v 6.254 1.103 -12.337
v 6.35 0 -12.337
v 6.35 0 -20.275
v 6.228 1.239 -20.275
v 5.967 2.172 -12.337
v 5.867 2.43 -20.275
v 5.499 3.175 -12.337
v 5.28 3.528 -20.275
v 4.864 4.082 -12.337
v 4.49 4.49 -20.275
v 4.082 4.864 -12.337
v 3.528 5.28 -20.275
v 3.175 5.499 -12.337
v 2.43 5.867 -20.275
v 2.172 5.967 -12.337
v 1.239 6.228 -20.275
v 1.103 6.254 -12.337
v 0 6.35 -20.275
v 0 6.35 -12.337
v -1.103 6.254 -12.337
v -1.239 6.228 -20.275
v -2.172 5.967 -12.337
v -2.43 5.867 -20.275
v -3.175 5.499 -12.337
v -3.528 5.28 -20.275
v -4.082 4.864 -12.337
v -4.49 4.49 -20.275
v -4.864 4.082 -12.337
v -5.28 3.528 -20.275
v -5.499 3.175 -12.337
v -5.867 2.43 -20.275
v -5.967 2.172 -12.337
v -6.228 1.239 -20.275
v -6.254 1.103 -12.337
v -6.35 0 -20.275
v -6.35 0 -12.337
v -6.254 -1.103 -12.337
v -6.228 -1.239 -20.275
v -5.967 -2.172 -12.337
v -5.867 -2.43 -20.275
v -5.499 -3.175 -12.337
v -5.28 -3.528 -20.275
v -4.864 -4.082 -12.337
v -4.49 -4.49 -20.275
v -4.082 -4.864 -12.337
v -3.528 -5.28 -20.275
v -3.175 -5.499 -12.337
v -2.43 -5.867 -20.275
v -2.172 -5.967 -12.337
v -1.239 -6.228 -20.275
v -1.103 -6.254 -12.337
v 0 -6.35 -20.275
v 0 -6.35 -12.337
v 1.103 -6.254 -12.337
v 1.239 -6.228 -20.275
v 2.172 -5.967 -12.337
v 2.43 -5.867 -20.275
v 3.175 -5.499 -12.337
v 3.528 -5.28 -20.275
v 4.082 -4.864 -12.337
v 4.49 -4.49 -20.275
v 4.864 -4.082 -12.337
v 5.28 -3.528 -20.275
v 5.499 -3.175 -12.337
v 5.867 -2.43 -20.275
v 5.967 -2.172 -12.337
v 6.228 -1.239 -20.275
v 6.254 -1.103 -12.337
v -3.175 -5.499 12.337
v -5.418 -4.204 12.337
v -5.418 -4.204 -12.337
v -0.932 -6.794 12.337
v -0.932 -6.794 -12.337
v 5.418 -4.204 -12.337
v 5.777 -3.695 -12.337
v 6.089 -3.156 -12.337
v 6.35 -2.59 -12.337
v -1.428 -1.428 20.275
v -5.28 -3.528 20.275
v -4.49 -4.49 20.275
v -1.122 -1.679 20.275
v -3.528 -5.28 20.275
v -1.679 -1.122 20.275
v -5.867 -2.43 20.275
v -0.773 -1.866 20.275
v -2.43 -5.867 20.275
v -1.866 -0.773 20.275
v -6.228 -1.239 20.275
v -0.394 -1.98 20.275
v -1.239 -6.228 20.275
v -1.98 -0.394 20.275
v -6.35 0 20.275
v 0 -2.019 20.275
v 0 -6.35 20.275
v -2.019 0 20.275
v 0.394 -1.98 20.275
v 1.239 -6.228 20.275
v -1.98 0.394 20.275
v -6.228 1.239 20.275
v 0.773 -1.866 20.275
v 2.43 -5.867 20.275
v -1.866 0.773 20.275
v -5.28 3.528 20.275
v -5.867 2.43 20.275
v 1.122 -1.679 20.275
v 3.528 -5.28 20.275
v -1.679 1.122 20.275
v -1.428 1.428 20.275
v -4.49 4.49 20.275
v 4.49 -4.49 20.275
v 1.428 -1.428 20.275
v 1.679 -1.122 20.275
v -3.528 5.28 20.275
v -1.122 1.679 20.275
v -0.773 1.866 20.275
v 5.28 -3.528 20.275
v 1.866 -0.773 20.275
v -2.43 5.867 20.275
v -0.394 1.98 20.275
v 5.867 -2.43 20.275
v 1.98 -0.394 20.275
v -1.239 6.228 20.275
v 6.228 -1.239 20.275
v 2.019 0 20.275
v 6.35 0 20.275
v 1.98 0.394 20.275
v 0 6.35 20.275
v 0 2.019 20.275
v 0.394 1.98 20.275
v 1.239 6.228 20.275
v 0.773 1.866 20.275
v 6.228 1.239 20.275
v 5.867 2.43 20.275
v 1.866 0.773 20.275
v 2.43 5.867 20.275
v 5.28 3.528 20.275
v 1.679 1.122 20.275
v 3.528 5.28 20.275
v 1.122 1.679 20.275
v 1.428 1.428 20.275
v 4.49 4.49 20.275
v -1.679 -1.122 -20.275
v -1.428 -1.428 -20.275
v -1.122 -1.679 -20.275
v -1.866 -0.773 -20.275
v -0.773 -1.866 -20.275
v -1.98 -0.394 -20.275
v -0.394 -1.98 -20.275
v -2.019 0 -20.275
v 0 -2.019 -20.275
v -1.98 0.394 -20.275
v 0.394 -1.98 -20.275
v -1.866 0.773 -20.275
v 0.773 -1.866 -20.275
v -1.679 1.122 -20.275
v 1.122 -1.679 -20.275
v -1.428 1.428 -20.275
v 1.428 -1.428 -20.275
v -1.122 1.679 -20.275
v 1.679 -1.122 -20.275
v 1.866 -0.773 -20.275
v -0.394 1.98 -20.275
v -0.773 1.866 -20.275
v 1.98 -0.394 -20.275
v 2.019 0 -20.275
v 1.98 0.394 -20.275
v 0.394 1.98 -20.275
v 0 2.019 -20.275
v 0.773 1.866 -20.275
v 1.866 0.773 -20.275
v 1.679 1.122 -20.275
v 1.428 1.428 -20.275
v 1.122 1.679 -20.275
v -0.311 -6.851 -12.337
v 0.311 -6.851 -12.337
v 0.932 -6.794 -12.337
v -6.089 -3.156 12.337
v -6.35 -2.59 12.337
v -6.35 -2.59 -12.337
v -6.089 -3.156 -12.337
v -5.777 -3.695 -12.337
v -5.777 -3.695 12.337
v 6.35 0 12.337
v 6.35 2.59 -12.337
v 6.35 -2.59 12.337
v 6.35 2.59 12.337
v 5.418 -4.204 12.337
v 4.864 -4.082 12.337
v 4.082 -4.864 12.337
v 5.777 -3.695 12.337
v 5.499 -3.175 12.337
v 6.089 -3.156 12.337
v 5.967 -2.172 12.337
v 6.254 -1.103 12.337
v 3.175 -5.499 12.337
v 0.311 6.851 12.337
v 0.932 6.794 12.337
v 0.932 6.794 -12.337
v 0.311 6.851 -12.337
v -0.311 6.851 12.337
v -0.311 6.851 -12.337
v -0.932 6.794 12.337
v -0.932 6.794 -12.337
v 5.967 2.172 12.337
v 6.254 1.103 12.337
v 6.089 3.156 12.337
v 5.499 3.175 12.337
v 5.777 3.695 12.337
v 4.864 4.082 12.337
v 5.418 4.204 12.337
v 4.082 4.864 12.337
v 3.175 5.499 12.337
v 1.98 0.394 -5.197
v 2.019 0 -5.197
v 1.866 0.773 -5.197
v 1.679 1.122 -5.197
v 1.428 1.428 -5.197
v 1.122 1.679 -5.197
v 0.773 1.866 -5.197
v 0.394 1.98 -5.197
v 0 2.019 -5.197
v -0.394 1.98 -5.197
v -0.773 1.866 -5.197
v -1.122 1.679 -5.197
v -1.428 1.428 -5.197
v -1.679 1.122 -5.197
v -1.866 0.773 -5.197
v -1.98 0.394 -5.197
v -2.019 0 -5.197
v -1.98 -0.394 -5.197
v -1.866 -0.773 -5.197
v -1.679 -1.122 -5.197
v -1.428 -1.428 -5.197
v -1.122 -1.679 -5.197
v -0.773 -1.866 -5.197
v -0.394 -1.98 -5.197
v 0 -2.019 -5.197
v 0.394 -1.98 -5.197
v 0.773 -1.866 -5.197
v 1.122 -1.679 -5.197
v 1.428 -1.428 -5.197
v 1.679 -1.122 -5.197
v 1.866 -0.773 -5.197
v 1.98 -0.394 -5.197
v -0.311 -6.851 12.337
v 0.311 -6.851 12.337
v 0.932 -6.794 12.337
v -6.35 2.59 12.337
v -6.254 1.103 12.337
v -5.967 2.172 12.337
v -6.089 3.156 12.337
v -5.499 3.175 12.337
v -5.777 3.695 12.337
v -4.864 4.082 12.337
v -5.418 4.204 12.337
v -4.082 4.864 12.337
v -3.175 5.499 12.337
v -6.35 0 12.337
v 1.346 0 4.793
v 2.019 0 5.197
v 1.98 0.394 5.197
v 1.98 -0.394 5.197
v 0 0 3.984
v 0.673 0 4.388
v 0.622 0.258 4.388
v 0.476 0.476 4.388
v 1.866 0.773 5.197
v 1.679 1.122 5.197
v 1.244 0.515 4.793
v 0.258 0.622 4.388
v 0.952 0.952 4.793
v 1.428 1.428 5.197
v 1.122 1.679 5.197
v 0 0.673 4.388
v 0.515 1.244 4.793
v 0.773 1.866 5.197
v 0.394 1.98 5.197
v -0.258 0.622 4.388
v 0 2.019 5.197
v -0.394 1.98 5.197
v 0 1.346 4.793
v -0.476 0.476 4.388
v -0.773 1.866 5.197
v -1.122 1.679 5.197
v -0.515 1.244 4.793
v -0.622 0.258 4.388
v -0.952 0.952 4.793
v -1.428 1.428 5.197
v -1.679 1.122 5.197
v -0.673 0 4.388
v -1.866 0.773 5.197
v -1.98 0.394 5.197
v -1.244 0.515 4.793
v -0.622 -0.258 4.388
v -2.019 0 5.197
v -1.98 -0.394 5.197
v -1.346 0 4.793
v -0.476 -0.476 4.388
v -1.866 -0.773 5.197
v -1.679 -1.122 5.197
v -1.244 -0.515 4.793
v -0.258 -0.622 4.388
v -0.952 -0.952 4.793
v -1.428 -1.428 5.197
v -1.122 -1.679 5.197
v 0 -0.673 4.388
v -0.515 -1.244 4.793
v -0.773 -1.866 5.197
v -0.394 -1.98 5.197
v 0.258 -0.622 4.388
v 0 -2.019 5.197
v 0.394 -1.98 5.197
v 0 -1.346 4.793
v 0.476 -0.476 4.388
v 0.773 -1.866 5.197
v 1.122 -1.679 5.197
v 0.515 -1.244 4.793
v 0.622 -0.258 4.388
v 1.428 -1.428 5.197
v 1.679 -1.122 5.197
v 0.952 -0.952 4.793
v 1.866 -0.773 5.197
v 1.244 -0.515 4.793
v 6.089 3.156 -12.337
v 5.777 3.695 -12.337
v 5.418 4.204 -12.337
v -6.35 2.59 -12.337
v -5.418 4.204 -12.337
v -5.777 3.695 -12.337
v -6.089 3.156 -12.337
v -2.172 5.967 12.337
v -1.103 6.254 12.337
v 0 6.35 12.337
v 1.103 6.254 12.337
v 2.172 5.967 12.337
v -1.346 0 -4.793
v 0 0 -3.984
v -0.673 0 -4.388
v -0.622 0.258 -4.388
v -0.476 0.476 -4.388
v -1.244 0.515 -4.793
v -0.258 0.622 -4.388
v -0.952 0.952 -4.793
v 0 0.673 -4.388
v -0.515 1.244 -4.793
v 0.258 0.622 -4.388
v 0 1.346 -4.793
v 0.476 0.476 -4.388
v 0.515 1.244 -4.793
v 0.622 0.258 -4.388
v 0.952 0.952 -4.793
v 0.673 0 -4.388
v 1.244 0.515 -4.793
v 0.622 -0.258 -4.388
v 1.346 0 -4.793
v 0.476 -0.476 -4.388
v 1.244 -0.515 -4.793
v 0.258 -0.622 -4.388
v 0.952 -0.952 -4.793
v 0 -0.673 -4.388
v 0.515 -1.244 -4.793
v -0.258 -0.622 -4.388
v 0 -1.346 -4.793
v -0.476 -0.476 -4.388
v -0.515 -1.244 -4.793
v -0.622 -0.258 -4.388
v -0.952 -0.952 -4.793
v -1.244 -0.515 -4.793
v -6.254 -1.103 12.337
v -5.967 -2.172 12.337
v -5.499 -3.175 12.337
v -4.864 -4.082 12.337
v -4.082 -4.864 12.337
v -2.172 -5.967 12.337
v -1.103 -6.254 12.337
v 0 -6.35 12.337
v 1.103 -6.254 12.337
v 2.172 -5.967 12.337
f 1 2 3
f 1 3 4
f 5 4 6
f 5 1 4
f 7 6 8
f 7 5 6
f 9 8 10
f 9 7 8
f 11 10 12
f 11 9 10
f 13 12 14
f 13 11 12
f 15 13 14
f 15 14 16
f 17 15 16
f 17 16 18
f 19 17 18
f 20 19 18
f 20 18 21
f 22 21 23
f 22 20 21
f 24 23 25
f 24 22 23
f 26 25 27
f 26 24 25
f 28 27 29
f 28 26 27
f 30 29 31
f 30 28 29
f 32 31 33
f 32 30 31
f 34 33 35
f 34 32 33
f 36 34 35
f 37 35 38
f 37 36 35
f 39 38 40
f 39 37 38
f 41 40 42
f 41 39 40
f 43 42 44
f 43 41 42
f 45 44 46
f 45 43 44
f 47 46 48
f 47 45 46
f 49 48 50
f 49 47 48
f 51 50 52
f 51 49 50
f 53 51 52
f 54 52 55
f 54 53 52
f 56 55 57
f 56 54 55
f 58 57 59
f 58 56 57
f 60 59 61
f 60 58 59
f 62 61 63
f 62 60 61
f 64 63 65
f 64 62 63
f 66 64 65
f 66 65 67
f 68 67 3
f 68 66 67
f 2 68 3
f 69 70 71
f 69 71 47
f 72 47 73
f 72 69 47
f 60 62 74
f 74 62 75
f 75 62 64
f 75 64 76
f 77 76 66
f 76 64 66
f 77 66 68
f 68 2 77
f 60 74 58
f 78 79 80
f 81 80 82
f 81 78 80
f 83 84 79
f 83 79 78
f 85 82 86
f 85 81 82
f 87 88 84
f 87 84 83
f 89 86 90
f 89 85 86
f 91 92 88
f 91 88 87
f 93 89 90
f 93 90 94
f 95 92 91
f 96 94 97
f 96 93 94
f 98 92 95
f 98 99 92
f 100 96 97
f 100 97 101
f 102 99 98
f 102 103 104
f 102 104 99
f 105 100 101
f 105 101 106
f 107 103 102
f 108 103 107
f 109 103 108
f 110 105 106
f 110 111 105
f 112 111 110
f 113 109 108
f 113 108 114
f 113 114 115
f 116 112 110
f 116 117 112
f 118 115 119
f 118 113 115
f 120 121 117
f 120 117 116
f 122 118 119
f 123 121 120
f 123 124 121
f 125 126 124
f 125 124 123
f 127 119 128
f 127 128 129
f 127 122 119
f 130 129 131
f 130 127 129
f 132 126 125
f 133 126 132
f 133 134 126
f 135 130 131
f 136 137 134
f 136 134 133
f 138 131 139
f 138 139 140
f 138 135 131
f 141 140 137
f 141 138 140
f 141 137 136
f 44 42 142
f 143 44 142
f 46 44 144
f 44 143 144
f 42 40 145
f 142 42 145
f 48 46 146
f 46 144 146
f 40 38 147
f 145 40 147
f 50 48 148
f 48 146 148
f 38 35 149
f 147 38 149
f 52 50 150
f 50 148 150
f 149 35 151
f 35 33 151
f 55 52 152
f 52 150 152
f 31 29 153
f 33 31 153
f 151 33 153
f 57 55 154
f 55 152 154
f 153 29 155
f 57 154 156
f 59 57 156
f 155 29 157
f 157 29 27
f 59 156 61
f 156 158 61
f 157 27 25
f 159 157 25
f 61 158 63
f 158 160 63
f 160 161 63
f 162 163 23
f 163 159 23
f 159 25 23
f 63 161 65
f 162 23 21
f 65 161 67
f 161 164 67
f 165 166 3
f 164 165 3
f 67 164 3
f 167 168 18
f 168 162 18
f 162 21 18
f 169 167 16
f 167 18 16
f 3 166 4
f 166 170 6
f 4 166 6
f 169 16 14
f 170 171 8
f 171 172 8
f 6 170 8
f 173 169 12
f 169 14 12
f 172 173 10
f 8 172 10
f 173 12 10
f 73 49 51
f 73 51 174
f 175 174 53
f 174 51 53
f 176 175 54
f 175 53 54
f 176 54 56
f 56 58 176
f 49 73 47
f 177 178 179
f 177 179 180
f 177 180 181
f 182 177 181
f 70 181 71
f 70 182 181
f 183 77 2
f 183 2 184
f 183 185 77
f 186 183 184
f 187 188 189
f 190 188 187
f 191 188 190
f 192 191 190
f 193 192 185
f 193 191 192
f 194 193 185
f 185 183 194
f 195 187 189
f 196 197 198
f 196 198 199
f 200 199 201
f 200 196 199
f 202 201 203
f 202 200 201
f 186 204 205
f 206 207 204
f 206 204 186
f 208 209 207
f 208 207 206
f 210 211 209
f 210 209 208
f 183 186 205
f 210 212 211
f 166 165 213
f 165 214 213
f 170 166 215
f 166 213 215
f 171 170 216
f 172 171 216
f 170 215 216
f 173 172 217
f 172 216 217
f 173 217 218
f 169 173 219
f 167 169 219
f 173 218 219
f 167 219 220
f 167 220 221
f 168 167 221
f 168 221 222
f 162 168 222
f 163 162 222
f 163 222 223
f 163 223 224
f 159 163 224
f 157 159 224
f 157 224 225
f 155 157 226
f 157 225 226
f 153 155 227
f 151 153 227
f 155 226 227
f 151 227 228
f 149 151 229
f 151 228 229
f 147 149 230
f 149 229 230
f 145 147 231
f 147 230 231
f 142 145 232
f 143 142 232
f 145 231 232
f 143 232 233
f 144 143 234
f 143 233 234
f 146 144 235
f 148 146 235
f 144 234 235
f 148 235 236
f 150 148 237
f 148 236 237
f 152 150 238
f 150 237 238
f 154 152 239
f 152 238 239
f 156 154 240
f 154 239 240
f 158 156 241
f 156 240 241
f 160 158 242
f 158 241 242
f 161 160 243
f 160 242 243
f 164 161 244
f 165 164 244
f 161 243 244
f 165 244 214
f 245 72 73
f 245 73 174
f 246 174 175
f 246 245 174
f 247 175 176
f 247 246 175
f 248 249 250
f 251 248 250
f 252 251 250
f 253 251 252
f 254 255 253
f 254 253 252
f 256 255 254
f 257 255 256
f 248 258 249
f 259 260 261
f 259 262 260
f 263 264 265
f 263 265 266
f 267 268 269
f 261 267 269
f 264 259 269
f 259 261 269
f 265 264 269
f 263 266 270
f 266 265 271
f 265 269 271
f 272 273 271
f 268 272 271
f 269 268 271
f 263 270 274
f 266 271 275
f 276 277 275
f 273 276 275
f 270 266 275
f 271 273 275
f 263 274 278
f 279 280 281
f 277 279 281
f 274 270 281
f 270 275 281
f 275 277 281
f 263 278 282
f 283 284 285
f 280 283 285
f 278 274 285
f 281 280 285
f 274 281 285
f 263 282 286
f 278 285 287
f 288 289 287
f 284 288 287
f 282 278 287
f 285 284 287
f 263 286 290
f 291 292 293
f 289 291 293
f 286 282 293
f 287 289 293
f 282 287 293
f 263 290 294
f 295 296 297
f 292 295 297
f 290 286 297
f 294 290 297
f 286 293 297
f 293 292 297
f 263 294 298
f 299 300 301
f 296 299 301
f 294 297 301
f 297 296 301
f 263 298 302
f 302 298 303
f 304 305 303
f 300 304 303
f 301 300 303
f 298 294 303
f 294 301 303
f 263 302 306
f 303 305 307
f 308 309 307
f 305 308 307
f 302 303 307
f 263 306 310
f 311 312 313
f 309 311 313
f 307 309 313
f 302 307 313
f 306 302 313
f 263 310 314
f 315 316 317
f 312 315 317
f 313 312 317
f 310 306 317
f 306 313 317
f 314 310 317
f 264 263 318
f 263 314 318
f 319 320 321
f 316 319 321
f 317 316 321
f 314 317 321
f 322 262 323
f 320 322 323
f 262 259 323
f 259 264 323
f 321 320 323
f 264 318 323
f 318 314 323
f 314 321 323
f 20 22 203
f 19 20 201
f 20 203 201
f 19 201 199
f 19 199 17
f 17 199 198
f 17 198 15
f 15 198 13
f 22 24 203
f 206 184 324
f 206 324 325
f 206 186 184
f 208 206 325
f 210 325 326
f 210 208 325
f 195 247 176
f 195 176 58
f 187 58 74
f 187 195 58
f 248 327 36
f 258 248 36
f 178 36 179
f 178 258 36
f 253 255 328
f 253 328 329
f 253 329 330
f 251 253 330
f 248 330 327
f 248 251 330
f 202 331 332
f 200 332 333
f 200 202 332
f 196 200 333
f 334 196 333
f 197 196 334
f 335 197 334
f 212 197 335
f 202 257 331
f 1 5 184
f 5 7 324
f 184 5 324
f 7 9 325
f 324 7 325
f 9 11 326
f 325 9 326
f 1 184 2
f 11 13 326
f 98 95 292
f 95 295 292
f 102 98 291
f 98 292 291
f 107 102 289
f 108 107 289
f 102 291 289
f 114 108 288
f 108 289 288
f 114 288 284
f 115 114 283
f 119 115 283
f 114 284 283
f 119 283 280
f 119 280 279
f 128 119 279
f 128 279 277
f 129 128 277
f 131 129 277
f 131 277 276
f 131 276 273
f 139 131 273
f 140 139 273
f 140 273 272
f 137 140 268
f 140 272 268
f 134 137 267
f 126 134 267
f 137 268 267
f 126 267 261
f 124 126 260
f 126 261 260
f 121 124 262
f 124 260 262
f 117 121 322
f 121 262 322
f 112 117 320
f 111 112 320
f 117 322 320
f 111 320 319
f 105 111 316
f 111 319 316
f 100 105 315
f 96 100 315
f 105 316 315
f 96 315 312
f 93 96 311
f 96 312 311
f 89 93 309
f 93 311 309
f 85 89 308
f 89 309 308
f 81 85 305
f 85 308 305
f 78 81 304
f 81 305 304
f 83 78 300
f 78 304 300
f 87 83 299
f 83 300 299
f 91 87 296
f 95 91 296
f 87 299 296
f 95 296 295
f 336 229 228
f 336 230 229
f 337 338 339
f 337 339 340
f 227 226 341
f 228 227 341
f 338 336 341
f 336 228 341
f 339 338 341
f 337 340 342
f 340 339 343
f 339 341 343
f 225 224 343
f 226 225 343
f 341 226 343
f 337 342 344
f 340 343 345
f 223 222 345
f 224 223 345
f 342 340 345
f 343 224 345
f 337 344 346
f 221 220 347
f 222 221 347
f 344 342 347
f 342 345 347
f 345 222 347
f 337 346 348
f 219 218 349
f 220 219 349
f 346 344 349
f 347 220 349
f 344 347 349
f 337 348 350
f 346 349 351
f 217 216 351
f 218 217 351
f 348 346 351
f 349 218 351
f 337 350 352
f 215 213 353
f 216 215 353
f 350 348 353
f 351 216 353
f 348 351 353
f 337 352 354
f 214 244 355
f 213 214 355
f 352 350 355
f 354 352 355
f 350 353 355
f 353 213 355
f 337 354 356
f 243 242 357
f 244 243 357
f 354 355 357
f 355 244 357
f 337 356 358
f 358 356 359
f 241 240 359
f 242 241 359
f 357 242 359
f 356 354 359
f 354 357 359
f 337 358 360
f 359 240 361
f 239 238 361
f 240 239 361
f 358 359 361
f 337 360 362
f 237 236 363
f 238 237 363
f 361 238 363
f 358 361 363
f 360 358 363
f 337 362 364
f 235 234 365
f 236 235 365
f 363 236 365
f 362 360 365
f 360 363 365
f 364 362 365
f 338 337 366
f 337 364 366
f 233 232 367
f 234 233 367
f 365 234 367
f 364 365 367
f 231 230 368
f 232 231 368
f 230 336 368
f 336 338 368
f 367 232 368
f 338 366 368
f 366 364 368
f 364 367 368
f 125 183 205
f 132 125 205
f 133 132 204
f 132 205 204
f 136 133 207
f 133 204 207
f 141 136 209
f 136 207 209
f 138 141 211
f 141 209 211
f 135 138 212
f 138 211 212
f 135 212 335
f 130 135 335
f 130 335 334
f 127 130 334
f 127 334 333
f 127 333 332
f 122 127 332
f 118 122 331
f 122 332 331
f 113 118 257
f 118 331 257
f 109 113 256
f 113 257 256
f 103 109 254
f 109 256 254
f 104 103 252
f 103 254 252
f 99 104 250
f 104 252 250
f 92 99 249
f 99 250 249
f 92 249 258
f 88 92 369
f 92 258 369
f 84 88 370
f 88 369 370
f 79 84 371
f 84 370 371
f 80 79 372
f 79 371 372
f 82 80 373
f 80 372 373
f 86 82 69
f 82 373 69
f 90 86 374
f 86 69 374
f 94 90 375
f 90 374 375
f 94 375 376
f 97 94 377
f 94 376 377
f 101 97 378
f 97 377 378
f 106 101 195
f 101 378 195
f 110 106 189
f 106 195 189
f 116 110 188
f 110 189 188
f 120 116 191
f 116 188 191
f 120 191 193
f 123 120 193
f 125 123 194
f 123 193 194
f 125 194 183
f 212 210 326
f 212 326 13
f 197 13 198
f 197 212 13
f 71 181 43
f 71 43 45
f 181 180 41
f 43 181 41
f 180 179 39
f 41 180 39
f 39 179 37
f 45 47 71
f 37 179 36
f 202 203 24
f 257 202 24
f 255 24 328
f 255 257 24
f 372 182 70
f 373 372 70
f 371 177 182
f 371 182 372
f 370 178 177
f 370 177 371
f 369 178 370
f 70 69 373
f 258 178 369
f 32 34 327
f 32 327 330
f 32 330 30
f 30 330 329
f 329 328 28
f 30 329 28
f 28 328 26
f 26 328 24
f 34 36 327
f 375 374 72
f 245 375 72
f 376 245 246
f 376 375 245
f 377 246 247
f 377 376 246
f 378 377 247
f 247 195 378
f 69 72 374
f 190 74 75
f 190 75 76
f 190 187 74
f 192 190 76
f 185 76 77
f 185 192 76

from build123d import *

# Parameters (mm, degrees)
BOSS_EXTRUDE1_DEPTH                  = 12.337299938
SKETCH2_R                            = 6.35
BOSS_EXTRUDE2_DEPTH                  = 7.9375
F_10_32_TAPPED_HOLE1_D               = 4.0386
F_10_32_TAPPED_HOLE1_DEPTH           = 15.07744
F_10_32_TAPPED_HOLE1_TIP             = 1.213317848
F_10_32_TAPPED_HOLE1_ON_FACE_2_D     = 4.0386
F_10_32_TAPPED_HOLE1_ON_FACE_2_DEPTH = 15.07744
F_10_32_TAPPED_HOLE1_ON_FACE_2_TIP   = 1.213317848


with BuildPart() as part:
    # Sketch1 → Boss-Extrude1 (new, symmetric)
    with BuildSketch(Plane.XY):
        with BuildLine():
            ThreePointArc((6.35, 2.590301913), (5.939202219, 3.429), (5.41826726, 4.204110358))
            Line((5.41826726, 4.204110358), (0.93173274, 6.79441227))
            ThreePointArc((0.93173274, 6.79441227), (0, 6.858), (-0.93173274, 6.79441227))
            Line((-0.93173274, 6.79441227), (-5.41826726, 4.204110358))
            ThreePointArc((-5.41826726, 4.204110358), (-5.939202219, 3.429), (-6.35, 2.590301913))
            Line((-6.35, 2.590301913), (-6.35, -2.590301913))
            ThreePointArc((-6.35, -2.590301913), (-5.939202219, -3.429), (-5.41826726, -4.204110358))
            Line((-5.41826726, -4.204110358), (-0.93173274, -6.79441227))
            ThreePointArc((-0.93173274, -6.79441227), (0, -6.858), (0.93173274, -6.79441227))
            Line((0.93173274, -6.79441227), (5.41826726, -4.204110358))
            ThreePointArc((5.41826726, -4.204110358), (5.939202219, -3.429), (6.35, -2.590301913))
            Line((6.35, -2.590301913), (6.35, 2.590301913))
        make_face()
    extrude(amount=BOSS_EXTRUDE1_DEPTH, both=True)

    # Sketch2 → Boss-Extrude2 (add)
    with BuildSketch(Plane.XY.offset(12.337299938)):
        Circle(SKETCH2_R)
    boss_extrude2 = extrude(amount=BOSS_EXTRUDE2_DEPTH)

    # Mirror1: Boss-Extrude2 across plane
    add(boss_extrude2.mirror(Plane.XY))

    # #10-32 Tapped Hole1
    with Locations(Plane.XY.offset(20.274799938)):
        with Locations((0, 0)):
            Hole(F_10_32_TAPPED_HOLE1_D / 2, depth=F_10_32_TAPPED_HOLE1_DEPTH)
            with Locations((0, 0, -(F_10_32_TAPPED_HOLE1_DEPTH + F_10_32_TAPPED_HOLE1_TIP / 2))):  # 118° drill point
                Cone(0, F_10_32_TAPPED_HOLE1_D / 2, F_10_32_TAPPED_HOLE1_TIP, mode=Mode.SUBTRACT)

    # #10-32 Tapped Hole1 on face 2
    with Locations(Plane(origin=(0, 0, -20.274799938), x_dir=(-1, 0, 0), z_dir=(0, 0, -1))):
        with Locations((0, 0)):
            Hole(F_10_32_TAPPED_HOLE1_ON_FACE_2_D / 2, depth=F_10_32_TAPPED_HOLE1_ON_FACE_2_DEPTH)
            with Locations((0, 0, -(F_10_32_TAPPED_HOLE1_ON_FACE_2_DEPTH + F_10_32_TAPPED_HOLE1_ON_FACE_2_TIP / 2))):  # 118° drill point
                Cone(0, F_10_32_TAPPED_HOLE1_ON_FACE_2_D / 2, F_10_32_TAPPED_HOLE1_ON_FACE_2_TIP, mode=Mode.SUBTRACT)


solid = part.part
